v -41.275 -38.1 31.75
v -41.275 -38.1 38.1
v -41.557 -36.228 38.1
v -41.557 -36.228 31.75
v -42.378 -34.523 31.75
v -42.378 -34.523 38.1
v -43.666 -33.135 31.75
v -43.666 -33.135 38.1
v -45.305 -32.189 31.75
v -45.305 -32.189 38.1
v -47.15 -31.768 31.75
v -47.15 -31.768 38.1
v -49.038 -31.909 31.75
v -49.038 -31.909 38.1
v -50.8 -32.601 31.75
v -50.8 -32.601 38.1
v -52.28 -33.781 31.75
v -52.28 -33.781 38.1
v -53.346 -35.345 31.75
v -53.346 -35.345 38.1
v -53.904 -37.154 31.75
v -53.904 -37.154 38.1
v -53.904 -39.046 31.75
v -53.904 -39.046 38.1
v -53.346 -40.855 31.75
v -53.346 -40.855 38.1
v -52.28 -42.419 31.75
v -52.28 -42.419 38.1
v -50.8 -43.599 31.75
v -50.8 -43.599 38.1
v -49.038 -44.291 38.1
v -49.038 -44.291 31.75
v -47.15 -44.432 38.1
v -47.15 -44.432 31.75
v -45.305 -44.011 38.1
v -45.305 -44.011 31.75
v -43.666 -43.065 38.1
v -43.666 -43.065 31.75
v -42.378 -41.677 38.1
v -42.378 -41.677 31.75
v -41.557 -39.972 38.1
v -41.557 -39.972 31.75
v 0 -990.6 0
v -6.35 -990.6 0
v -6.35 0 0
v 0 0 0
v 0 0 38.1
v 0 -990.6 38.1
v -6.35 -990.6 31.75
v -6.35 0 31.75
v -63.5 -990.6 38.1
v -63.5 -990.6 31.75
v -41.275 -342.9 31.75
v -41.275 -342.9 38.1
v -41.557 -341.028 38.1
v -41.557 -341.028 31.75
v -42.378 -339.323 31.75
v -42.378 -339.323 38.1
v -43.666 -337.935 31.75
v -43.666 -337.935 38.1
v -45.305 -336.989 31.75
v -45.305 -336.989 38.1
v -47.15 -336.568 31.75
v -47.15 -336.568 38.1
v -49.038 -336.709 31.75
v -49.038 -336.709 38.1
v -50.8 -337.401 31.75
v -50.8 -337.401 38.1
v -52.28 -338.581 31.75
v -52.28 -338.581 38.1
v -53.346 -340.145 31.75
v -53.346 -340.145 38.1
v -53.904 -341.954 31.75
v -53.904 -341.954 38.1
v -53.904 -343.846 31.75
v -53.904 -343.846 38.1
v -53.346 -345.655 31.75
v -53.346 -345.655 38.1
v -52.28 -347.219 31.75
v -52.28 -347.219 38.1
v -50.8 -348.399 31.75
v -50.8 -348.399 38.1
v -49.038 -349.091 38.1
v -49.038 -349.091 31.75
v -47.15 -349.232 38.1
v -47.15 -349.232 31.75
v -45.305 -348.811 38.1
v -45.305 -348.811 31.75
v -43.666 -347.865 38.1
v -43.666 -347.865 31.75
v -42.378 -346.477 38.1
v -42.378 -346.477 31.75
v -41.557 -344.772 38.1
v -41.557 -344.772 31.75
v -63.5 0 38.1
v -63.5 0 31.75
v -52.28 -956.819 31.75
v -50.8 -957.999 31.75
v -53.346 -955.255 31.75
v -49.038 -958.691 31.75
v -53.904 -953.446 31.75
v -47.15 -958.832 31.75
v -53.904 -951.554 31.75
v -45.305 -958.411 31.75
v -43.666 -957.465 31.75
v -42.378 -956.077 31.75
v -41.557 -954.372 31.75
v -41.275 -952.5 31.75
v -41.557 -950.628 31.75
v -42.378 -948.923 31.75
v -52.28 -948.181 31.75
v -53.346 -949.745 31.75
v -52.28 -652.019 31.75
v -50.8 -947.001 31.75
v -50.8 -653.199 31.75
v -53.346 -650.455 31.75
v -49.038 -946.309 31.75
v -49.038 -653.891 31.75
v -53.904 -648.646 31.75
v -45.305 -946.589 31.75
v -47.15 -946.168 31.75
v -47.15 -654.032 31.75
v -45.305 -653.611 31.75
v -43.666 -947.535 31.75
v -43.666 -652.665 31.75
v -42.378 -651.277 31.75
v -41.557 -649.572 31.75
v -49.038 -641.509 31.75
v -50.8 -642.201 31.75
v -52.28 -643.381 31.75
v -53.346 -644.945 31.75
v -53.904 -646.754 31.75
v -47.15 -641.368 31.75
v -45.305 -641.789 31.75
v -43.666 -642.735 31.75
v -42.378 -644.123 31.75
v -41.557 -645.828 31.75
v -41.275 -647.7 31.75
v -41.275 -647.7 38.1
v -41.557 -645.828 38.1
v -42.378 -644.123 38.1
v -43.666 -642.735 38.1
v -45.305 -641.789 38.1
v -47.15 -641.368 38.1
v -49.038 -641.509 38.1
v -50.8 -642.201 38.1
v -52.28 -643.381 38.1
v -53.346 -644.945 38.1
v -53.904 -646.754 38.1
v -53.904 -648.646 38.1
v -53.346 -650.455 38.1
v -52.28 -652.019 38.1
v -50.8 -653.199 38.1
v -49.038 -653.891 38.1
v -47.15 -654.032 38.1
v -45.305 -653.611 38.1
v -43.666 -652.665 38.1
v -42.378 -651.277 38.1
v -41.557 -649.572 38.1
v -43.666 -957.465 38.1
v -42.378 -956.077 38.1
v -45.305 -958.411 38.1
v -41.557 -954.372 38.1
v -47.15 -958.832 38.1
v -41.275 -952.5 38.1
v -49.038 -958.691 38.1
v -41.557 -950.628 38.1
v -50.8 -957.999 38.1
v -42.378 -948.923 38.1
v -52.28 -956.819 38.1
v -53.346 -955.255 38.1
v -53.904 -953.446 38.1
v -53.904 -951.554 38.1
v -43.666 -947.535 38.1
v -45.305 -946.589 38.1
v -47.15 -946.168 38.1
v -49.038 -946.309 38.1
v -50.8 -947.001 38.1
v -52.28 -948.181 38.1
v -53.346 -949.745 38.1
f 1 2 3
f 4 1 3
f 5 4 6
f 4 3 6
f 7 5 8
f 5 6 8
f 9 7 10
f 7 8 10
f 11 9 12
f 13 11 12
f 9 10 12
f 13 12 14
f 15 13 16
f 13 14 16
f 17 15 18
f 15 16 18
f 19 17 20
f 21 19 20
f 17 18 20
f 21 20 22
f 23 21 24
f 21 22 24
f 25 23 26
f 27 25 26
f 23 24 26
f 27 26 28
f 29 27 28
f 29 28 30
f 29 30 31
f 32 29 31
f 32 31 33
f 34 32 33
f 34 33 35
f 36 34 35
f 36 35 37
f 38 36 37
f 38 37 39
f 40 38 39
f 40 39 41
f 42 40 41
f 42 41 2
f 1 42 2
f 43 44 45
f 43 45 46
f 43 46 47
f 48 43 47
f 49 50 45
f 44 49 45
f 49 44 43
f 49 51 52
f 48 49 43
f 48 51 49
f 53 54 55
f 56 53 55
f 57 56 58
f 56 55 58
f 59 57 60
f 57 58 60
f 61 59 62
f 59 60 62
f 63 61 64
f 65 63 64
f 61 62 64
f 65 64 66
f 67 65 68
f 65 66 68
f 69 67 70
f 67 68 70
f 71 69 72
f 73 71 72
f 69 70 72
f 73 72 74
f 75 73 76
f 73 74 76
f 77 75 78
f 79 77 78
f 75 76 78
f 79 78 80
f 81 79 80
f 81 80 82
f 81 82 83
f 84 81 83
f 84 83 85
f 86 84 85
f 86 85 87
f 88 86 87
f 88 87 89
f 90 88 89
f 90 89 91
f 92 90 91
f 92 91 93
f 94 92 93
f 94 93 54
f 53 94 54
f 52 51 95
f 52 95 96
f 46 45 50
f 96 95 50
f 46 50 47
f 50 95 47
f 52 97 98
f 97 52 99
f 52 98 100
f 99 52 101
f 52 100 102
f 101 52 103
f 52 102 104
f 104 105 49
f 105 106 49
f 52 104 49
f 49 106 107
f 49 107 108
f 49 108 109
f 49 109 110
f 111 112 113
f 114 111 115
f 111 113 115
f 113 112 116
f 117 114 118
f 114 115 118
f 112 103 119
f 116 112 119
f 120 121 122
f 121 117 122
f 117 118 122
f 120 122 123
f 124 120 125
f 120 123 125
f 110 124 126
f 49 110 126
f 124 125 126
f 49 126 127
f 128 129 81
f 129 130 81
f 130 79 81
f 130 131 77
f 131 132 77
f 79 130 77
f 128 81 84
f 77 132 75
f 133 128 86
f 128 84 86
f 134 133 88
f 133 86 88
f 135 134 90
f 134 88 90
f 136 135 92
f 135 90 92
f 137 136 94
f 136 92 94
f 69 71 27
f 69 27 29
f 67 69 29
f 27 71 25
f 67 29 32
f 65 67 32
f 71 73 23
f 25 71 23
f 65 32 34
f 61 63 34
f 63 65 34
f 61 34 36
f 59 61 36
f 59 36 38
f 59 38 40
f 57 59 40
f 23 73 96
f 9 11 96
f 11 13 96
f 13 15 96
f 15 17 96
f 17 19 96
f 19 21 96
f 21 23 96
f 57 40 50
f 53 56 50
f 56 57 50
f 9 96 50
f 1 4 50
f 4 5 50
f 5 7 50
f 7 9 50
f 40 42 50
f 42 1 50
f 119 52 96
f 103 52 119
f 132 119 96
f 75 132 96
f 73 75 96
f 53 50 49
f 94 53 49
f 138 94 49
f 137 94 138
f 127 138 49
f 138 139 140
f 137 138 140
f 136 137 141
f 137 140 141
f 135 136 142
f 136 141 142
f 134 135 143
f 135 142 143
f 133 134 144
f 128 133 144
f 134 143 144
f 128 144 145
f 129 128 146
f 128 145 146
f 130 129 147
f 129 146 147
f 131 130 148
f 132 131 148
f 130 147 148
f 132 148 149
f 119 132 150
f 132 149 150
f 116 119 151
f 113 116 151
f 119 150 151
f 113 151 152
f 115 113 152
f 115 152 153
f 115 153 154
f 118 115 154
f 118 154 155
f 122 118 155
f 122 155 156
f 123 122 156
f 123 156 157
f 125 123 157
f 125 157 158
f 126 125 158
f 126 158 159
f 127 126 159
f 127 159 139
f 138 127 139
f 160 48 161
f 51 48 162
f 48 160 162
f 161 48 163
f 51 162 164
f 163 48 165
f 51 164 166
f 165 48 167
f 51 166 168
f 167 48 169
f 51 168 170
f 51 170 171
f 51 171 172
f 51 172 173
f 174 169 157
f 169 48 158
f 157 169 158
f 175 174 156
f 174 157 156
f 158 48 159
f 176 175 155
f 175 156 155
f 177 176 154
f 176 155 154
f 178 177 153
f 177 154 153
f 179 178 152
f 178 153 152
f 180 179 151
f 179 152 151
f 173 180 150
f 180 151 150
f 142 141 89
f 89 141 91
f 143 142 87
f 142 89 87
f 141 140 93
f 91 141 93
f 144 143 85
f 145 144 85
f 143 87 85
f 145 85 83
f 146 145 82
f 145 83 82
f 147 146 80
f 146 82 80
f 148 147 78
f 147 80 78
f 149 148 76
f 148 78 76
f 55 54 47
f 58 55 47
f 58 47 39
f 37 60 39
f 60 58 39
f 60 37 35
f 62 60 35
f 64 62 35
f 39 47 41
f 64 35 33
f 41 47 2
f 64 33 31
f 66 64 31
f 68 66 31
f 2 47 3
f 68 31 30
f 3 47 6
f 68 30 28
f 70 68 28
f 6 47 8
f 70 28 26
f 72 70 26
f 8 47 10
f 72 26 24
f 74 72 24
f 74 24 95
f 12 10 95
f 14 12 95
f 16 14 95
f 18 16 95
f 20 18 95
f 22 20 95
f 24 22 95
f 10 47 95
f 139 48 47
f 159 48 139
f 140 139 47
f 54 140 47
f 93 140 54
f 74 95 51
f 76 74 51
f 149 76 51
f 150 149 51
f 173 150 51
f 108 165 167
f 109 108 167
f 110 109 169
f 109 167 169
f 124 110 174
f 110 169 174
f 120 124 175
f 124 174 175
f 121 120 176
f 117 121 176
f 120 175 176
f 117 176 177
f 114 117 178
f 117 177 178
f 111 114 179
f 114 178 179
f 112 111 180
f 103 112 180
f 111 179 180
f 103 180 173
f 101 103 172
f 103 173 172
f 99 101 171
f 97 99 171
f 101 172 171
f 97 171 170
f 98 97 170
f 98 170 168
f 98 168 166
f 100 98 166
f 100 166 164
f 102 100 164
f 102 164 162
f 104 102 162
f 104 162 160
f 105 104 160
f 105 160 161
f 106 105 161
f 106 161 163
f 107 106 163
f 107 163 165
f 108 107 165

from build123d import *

# Parameters (mm, degrees)
F1_DEPTH = 990.6
F2_R     = 6.35
F3_DEPTH = 25.4


with BuildPart() as f1:
    # F0 (on Front) → F1 (new body)
    with BuildSketch(Plane.XZ):
        Polygon((-6.35, 0), (0, 0), (0, 38.1), (-63.5, 38.1), (-63.5, 31.75), (-6.35, 31.75), align=None)
    extrude(amount=F1_DEPTH)

    # F2 (on face) → F3 (cut)
    with BuildSketch(Plane.XY.offset(38.1)):
        with Locations((-47.625, -952.5)):
            Circle(F2_R)
        with Locations((-47.625, -647.7)):
            Circle(F2_R)
        with Locations((-47.625, -342.9)):
            Circle(F2_R)
        with Locations((-47.625, -38.1)):
            Circle(F2_R)
    extrude(amount=-F3_DEPTH, mode=Mode.SUBTRACT)


solid = f1.part
